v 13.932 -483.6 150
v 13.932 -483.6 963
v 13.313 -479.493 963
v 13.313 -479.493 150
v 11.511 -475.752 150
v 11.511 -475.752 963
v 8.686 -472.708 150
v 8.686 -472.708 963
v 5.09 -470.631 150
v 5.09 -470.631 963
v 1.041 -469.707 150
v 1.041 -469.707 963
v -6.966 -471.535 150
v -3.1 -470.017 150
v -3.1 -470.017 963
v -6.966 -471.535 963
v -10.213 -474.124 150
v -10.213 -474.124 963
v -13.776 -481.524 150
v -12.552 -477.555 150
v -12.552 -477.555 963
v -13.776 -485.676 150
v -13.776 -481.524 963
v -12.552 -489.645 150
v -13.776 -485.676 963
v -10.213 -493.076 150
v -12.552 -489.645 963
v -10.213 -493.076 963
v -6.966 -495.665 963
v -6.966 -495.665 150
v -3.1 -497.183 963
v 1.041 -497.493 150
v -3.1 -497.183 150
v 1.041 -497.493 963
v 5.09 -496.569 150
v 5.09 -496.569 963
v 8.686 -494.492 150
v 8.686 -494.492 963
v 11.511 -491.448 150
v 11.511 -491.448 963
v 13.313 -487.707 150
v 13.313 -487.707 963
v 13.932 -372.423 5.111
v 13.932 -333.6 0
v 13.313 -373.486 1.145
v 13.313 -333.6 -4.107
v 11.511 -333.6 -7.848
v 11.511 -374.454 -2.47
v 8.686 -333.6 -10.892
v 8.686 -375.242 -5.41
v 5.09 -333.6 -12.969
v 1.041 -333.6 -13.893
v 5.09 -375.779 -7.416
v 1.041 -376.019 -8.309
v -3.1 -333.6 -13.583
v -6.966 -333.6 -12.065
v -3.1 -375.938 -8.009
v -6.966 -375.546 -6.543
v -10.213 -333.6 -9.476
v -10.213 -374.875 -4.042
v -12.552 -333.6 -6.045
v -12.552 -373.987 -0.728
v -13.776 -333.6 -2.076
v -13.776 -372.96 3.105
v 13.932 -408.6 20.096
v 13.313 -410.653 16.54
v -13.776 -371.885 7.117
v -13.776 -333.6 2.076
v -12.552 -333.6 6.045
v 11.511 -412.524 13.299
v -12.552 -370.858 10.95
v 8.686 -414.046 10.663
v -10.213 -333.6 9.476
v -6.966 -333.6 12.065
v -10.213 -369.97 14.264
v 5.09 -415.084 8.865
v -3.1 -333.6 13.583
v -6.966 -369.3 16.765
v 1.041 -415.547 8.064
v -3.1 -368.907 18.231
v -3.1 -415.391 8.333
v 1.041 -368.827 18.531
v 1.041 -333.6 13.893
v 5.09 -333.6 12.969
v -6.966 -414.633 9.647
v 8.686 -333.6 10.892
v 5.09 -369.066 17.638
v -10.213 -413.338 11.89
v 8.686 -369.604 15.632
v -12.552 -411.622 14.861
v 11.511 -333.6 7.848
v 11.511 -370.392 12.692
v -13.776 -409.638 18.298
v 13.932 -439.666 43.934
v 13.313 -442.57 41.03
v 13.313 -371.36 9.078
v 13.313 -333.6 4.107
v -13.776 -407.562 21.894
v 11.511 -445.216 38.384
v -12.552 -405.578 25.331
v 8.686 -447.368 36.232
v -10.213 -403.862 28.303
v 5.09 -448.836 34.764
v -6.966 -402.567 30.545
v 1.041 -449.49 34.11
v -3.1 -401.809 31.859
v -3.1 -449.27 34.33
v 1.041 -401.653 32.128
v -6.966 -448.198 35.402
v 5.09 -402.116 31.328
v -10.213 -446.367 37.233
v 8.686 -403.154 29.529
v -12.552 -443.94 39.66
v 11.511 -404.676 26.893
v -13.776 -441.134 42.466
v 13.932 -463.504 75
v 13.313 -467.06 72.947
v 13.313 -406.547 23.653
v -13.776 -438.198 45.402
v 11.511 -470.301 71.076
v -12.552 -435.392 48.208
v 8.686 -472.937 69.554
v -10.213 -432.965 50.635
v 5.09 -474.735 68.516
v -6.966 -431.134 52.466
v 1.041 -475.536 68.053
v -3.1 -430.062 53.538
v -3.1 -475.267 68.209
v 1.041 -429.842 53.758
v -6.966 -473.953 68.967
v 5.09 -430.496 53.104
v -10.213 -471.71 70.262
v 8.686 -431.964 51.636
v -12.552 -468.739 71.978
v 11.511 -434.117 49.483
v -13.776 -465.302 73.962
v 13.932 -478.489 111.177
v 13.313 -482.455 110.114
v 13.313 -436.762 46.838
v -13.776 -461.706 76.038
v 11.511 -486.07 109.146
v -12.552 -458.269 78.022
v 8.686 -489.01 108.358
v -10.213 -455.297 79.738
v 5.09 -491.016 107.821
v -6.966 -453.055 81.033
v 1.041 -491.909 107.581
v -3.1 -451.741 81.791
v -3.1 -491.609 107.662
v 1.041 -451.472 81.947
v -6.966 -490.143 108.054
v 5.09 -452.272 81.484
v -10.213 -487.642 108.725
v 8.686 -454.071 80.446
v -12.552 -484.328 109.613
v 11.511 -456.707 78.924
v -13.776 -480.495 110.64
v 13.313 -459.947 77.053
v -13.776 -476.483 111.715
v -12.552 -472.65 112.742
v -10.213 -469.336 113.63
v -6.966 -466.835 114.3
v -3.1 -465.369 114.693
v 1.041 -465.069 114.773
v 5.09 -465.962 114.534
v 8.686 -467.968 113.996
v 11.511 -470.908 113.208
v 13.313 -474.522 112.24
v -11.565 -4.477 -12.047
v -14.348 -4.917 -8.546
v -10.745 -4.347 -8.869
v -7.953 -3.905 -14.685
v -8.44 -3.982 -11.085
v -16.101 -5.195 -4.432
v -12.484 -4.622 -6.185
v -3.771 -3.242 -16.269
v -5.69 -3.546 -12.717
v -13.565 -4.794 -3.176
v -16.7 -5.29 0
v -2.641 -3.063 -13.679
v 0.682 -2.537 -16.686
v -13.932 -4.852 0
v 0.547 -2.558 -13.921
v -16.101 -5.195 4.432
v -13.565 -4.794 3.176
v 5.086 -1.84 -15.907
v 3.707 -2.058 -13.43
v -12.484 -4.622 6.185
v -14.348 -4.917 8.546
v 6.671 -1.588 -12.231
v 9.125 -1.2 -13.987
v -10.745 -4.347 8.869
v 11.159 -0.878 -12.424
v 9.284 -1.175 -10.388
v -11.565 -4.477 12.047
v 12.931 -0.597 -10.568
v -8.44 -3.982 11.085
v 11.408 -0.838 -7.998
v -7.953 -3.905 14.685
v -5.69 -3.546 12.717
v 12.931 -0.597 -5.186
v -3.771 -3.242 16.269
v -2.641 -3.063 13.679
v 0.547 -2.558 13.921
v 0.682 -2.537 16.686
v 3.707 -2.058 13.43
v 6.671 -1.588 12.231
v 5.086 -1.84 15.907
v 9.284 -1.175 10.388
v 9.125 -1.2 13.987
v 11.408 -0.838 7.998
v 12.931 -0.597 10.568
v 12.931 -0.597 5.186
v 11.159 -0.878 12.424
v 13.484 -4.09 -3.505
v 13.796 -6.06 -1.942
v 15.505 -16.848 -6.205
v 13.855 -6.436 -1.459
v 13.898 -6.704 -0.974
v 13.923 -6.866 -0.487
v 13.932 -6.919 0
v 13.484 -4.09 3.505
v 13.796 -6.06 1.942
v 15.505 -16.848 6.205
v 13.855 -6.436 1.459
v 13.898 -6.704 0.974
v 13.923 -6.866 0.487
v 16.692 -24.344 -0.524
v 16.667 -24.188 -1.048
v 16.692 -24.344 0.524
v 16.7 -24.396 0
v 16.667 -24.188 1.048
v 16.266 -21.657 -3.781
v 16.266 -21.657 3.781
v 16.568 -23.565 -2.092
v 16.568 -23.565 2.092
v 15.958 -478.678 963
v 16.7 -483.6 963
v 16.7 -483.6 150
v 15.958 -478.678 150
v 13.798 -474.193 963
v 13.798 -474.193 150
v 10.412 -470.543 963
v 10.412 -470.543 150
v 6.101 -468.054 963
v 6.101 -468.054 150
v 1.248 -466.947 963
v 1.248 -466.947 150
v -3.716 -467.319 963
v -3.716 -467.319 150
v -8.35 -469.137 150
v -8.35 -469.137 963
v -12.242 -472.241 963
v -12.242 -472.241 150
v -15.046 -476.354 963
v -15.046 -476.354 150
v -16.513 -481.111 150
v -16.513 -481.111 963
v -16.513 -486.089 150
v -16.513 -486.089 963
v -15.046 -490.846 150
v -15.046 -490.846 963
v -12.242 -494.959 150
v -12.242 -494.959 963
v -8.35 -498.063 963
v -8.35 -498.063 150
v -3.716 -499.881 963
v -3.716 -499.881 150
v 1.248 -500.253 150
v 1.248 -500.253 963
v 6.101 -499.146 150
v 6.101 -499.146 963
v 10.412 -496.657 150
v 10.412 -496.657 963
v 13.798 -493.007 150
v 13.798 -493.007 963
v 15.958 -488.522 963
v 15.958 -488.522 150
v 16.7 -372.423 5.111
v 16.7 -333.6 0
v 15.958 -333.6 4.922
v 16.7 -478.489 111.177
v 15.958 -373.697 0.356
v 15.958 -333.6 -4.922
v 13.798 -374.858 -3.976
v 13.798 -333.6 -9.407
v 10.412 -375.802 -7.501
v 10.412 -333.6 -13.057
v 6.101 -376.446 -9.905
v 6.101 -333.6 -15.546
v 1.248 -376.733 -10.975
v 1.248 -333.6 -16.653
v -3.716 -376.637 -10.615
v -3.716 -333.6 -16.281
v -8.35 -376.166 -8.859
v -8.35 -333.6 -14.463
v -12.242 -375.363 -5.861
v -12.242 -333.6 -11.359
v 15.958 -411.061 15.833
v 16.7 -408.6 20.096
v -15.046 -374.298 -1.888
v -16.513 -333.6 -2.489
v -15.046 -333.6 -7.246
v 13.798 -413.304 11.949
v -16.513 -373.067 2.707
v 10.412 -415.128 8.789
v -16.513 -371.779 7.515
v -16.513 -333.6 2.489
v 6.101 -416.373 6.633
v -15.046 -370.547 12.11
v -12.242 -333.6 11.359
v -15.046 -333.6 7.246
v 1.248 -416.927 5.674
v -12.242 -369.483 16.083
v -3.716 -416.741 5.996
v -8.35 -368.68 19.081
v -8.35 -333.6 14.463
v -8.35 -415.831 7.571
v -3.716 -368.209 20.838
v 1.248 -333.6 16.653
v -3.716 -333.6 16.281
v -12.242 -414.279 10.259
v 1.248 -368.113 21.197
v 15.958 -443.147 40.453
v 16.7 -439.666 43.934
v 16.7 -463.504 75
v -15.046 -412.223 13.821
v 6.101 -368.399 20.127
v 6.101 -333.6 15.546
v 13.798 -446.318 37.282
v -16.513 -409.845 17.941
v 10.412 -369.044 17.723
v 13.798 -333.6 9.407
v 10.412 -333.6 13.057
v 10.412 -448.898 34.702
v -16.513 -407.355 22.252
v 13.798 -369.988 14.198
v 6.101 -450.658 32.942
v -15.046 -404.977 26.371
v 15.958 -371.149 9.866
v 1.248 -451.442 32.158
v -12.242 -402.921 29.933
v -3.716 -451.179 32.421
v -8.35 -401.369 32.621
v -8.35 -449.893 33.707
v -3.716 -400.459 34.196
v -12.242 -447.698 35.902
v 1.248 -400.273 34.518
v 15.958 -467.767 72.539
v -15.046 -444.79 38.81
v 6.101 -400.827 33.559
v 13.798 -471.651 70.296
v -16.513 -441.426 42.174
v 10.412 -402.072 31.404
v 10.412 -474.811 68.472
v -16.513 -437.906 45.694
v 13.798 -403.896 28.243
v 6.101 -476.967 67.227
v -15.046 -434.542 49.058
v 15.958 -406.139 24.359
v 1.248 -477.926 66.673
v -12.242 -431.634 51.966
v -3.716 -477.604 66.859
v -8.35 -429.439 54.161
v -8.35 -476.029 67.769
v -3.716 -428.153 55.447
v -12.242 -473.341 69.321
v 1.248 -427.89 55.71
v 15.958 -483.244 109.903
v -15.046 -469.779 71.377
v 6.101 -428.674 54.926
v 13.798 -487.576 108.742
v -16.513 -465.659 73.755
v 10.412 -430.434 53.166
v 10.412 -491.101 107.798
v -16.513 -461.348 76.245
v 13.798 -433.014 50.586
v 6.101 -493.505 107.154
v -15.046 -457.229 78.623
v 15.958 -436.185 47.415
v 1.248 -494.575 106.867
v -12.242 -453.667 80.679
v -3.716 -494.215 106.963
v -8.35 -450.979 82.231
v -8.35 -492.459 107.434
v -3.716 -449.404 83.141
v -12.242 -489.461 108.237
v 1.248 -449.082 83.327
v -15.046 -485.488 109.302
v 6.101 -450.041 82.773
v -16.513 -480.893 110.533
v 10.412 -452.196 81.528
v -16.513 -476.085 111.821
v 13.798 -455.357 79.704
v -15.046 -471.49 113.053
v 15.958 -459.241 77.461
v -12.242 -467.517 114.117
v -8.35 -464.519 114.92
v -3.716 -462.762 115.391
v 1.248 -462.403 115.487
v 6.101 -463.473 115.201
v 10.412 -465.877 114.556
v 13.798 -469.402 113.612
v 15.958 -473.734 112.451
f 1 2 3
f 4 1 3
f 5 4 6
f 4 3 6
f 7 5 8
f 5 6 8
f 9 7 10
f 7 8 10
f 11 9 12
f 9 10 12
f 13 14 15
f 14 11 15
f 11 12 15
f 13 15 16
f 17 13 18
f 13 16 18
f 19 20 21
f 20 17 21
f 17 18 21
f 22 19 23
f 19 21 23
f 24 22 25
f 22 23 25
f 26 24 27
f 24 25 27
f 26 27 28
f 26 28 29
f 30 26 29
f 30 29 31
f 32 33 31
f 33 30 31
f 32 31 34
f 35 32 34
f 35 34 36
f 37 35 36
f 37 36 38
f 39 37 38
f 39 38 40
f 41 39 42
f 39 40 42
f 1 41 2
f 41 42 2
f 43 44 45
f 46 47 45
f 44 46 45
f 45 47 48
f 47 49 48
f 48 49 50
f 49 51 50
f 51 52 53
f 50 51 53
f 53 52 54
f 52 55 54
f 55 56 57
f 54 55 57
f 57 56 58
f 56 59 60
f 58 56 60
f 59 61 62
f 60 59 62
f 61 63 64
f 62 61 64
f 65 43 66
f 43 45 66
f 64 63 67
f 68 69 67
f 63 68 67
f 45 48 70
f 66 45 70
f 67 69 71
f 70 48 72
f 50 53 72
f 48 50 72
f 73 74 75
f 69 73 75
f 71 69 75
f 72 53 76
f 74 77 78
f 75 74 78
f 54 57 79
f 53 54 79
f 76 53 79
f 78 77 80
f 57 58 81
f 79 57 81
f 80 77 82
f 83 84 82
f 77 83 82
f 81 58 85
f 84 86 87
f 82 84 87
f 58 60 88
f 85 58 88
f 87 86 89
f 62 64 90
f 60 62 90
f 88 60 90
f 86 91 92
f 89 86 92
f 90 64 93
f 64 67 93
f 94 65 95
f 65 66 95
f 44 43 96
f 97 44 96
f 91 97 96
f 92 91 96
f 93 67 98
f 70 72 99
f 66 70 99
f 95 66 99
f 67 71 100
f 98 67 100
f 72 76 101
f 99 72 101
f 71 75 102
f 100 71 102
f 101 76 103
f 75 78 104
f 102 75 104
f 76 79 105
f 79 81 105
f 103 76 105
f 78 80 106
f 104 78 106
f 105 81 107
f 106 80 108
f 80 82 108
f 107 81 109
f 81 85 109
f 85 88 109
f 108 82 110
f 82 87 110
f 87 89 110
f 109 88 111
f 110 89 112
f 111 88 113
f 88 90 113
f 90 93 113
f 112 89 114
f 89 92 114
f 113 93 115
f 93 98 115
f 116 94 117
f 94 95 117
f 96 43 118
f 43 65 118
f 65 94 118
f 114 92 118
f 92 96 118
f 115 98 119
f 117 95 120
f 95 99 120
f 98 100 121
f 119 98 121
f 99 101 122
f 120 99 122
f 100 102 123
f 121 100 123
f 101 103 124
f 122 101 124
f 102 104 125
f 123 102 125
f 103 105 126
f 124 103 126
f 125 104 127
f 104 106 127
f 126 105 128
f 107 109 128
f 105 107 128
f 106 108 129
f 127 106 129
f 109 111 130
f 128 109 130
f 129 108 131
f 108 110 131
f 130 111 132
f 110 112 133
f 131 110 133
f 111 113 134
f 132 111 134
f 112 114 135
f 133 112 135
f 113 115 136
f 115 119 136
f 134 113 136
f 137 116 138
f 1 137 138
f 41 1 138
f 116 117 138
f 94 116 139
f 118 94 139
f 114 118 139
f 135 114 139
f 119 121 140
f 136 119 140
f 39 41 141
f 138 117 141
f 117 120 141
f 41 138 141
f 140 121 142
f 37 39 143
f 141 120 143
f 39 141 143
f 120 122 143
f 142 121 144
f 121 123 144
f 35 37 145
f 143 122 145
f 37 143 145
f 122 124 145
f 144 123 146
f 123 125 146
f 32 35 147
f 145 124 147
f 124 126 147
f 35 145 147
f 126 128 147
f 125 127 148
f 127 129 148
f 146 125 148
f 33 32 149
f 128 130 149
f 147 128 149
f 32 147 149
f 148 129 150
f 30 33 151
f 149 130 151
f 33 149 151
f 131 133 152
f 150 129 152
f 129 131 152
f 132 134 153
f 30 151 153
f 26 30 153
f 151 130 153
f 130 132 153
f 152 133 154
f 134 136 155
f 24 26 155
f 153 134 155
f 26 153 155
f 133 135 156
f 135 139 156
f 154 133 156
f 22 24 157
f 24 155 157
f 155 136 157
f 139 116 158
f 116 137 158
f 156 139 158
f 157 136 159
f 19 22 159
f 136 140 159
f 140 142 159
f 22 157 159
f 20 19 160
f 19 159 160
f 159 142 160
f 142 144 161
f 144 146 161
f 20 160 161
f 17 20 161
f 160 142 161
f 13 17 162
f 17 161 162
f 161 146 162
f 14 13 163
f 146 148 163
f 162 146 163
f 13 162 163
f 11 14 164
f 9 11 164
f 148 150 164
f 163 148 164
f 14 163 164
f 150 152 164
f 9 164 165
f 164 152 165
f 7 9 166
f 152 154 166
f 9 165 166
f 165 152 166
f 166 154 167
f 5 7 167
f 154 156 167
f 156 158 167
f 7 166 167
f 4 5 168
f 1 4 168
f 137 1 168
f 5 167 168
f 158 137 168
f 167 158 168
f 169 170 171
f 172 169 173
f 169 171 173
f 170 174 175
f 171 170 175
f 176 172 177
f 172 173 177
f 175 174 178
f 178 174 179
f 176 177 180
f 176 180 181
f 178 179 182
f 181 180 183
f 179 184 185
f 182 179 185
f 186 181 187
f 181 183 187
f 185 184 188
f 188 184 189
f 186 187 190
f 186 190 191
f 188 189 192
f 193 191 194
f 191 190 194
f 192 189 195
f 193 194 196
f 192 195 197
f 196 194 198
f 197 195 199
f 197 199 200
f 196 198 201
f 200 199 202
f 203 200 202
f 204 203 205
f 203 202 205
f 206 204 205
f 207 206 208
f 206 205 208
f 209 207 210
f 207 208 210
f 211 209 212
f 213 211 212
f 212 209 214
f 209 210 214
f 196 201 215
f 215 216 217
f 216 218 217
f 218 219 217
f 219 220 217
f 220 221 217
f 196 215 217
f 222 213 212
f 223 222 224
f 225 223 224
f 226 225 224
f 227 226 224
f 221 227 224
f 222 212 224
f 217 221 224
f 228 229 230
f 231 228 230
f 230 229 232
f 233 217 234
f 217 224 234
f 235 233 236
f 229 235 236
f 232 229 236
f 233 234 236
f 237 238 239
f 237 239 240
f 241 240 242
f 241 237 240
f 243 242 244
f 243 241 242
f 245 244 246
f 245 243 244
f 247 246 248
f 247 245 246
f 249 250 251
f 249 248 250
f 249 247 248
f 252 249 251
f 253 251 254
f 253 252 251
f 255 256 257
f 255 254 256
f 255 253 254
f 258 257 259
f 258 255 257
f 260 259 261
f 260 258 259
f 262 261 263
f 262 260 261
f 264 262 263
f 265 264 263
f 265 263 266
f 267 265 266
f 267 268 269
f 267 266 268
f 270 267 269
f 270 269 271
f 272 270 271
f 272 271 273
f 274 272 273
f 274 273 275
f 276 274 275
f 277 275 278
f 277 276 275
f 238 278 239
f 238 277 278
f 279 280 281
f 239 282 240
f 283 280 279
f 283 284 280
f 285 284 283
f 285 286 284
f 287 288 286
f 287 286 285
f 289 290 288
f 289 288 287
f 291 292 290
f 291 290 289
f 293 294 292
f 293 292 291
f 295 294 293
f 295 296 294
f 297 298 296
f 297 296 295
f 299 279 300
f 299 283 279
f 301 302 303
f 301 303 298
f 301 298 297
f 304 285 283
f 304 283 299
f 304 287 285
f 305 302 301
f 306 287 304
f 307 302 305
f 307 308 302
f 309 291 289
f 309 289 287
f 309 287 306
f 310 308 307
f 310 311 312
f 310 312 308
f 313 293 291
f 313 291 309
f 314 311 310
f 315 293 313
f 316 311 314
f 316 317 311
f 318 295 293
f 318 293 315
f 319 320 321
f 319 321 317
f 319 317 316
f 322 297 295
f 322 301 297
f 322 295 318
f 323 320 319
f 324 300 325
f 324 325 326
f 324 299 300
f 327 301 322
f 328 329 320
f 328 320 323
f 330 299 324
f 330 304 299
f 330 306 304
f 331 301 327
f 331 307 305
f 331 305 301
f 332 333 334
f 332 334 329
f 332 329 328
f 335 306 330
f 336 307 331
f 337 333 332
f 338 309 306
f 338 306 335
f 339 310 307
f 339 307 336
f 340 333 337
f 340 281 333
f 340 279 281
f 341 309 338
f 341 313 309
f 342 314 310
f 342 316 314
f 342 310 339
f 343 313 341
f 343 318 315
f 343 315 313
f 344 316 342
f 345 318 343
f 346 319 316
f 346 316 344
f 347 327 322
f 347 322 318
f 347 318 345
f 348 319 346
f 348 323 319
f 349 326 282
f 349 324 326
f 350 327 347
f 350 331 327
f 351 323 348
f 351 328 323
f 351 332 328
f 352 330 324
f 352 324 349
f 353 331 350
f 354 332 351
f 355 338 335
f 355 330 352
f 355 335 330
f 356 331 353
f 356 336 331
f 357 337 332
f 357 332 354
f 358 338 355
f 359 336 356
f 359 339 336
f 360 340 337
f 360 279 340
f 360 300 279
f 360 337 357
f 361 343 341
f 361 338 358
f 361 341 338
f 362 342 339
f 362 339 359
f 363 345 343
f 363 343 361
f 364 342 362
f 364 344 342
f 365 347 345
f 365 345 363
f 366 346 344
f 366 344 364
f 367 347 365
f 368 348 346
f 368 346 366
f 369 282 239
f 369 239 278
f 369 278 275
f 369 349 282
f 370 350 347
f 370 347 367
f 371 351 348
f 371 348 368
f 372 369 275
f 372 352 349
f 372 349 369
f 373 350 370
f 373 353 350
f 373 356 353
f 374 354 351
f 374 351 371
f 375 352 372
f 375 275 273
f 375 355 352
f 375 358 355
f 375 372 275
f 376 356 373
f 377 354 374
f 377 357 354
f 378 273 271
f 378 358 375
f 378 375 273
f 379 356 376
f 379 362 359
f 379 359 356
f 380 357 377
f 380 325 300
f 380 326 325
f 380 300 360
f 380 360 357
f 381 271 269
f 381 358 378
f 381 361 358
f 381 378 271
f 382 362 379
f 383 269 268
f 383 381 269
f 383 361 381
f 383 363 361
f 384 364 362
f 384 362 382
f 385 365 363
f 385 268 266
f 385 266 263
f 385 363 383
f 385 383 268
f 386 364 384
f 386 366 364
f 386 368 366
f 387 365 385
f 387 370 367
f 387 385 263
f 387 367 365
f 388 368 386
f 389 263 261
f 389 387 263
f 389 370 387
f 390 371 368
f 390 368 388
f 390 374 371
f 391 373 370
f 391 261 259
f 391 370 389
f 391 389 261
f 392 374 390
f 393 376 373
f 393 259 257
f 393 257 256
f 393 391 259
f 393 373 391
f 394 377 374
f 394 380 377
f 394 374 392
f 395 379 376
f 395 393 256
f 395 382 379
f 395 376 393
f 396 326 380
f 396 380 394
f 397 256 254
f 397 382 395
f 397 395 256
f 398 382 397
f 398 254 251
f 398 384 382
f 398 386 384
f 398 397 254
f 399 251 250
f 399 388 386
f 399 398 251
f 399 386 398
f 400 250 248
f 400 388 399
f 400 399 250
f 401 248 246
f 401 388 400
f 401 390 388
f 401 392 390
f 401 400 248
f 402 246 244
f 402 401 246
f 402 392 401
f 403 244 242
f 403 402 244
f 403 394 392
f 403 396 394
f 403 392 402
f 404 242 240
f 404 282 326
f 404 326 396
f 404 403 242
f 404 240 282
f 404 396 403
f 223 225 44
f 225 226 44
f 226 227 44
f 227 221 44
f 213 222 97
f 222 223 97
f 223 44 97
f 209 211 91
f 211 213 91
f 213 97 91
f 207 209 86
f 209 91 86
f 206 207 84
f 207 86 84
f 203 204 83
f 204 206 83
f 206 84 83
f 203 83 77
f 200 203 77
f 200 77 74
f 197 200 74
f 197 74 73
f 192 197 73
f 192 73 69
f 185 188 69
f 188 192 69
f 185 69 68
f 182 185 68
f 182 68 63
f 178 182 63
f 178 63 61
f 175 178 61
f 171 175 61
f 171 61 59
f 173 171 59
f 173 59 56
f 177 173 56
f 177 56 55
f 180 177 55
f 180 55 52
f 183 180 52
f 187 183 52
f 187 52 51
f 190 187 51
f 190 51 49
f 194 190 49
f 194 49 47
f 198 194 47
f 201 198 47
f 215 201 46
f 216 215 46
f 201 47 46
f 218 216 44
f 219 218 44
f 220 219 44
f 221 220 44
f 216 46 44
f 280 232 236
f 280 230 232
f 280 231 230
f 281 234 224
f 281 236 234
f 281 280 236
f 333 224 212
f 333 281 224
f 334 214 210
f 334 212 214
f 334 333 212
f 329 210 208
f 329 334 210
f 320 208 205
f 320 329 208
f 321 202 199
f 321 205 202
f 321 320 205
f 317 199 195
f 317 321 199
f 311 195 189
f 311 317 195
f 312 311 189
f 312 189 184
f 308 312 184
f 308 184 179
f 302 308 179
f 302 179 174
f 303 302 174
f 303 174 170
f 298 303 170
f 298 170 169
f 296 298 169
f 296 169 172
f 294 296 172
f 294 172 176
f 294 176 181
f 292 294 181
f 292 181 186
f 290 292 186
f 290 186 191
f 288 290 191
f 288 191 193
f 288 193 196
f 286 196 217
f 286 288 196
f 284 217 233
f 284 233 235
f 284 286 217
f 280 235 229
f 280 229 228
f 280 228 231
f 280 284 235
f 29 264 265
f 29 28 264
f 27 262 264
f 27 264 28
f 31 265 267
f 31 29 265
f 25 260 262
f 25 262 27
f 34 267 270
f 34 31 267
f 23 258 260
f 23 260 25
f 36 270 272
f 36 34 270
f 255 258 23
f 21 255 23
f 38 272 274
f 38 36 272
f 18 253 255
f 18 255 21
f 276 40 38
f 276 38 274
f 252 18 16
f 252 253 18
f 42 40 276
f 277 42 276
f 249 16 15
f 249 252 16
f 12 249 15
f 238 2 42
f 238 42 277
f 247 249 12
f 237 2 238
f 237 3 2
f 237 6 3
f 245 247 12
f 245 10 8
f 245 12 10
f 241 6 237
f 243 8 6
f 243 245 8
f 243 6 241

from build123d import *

# Parameters (mm, degrees)
F1_R          = 16.7
F1_R_2        = 13.932
F4_DEPTH      = 16.7010001
F4_DEPTH_BACK = 963.001


with BuildPart() as f2:
    # F2: sweep along a path in F0
    with BuildLine(Plane.YZ) as f2_path:
        Line((0, 0), (-333.6, 0))
        ThreePointArc((-333.6, 0), (-439.666017178, 43.933982822), (-483.6, 150))
        Line((-483.6, 150), (-483.6, 963))
    # F1 (on Front) → F2 (sweep)
    with BuildSketch(Plane.XZ):
        Circle(F1_R)
        Circle(F1_R_2, mode=Mode.SUBTRACT)
    sweep(path=f2_path.line)

    # F3 (on Top) → F4 (cut, two sides)
    with BuildSketch(Plane.XY) as f4_sk:
        Polygon((-16.7, 0), (0, 0), (-16.7, 2.6450201534), align=None)
        Polygon((16.7, 0), (0, 0), (-16.7, 0), (-16.7, -5.2900403068), (12.9306502179, -0.5970063556), (16.7, -24.395744252), (16.7, -5.4741381354), (16.7, -2.6450201534), align=None)
    extrude(amount=-F4_DEPTH, mode=Mode.SUBTRACT)
    extrude(f4_sk.sketch, amount=F4_DEPTH_BACK, mode=Mode.SUBTRACT)


solid = f2.part
